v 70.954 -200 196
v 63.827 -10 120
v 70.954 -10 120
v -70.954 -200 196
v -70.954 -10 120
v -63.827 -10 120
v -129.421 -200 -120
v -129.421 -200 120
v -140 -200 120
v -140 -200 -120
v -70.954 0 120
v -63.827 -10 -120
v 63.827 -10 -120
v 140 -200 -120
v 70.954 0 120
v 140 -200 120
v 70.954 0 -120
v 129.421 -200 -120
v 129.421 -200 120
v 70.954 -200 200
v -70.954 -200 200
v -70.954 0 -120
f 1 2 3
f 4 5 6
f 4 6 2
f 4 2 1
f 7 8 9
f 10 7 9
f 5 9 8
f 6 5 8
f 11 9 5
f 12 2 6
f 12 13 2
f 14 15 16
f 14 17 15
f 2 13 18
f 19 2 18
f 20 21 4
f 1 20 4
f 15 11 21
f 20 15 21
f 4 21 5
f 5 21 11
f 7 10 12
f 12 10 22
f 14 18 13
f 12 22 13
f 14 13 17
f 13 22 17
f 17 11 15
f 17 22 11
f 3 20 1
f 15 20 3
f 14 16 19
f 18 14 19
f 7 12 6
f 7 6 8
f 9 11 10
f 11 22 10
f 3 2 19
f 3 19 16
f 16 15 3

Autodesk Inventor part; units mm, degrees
ref_plane "YZ Plane" through (0, 0, 0) normal (1, 0, 0) x (0, 1, 0)
ref_plane "XZ Plane" through (0, 0, 0) normal (0, 1, 0) x (-1, 0, 0)
sketch "Boceto1" plane through (0, 0, 0) normal (0, 0, 1) x (1, 0, 0)
  line L0 (0, 0) -> (70.9542, 0)
  line L1 (70.9542, 0) -> (140, -200)
  line L2 (140, -200) -> (0, -200)
  line L3 (0, -200) -> (0, 0) construction
  line L4 (0, 0) -> (-70.9542, 0)
  line L5 (-70.9542, 0) -> (-140, -200)
  line L6 (-140, -200) -> (0, -200)
  dimension "d0" = 280
  dimension "d1" = 200
extrude "Extrusión1" add sketch "Boceto1" along normal mid plane 240
sketch "Boceto2" plane through (0, 0, -120) normal (0, 0, -1) x (-1, 0, 0)
  line L0 (-63.8273, -10) -> (63.8273, -10)
  line L1 (140, -200) -> (-140, -200) projected
  line L2 (-63.8273, -10) -> (-129.4209, -200)
  line L3 (63.8273, -10) -> (129.4209, -200)
  line L4 (70.9542, 0) -> (-70.9542, 0) projected
  line L5 (140, -200) -> (70.9542, 0) projected
  line L6 (-70.9542, 0) -> (-140, -200) projected
  point P0 (0, 0)
  dimension "d4" = 10
  dimension "d7" = 10
  dimension "d8" = 10
extrude "Extrusión2" cut sketch "Boceto2" against normal blind 240 contours L0 L3 L1 L2
ref_plane "Plano de trabajo2" through (0, 205.5279, 120) normal (1, 0, 0) x (0, 0, -1)
sketch "Boceto4" plane through (0, 205.5279, 120) normal (1, 0, 0) x (0, 0, -1)
  line L0 (240, -205.5279) -> (0, -205.5279) projected
  line L1 (0, -205.5279) -> (-80, -405.5279)
  line L2 (-80, -405.5279) -> (-76, -405.5279)
  line L3 (0, -405.5279) -> (0, -205.5279)
  line L4 (0, -215.5279) -> (-76, -405.5279)
  line L5 (0, -215.5279) -> (0, -205.5279)
  line L6 (240, -215.5279) -> (0, -215.5279) projected
  line L7 (0, -215.5279) -> (0, -205.5279)
  line L8 (-80, -405.5279) -> (0, -405.5279) construction
  point P0 (120, -205.5279)
  dimension "d11" = 80
  dimension "d14" = 200
extrude "Extrusión3" add sketch "Boceto4" along normal mid plane 141.908
properties part number "chasis"
